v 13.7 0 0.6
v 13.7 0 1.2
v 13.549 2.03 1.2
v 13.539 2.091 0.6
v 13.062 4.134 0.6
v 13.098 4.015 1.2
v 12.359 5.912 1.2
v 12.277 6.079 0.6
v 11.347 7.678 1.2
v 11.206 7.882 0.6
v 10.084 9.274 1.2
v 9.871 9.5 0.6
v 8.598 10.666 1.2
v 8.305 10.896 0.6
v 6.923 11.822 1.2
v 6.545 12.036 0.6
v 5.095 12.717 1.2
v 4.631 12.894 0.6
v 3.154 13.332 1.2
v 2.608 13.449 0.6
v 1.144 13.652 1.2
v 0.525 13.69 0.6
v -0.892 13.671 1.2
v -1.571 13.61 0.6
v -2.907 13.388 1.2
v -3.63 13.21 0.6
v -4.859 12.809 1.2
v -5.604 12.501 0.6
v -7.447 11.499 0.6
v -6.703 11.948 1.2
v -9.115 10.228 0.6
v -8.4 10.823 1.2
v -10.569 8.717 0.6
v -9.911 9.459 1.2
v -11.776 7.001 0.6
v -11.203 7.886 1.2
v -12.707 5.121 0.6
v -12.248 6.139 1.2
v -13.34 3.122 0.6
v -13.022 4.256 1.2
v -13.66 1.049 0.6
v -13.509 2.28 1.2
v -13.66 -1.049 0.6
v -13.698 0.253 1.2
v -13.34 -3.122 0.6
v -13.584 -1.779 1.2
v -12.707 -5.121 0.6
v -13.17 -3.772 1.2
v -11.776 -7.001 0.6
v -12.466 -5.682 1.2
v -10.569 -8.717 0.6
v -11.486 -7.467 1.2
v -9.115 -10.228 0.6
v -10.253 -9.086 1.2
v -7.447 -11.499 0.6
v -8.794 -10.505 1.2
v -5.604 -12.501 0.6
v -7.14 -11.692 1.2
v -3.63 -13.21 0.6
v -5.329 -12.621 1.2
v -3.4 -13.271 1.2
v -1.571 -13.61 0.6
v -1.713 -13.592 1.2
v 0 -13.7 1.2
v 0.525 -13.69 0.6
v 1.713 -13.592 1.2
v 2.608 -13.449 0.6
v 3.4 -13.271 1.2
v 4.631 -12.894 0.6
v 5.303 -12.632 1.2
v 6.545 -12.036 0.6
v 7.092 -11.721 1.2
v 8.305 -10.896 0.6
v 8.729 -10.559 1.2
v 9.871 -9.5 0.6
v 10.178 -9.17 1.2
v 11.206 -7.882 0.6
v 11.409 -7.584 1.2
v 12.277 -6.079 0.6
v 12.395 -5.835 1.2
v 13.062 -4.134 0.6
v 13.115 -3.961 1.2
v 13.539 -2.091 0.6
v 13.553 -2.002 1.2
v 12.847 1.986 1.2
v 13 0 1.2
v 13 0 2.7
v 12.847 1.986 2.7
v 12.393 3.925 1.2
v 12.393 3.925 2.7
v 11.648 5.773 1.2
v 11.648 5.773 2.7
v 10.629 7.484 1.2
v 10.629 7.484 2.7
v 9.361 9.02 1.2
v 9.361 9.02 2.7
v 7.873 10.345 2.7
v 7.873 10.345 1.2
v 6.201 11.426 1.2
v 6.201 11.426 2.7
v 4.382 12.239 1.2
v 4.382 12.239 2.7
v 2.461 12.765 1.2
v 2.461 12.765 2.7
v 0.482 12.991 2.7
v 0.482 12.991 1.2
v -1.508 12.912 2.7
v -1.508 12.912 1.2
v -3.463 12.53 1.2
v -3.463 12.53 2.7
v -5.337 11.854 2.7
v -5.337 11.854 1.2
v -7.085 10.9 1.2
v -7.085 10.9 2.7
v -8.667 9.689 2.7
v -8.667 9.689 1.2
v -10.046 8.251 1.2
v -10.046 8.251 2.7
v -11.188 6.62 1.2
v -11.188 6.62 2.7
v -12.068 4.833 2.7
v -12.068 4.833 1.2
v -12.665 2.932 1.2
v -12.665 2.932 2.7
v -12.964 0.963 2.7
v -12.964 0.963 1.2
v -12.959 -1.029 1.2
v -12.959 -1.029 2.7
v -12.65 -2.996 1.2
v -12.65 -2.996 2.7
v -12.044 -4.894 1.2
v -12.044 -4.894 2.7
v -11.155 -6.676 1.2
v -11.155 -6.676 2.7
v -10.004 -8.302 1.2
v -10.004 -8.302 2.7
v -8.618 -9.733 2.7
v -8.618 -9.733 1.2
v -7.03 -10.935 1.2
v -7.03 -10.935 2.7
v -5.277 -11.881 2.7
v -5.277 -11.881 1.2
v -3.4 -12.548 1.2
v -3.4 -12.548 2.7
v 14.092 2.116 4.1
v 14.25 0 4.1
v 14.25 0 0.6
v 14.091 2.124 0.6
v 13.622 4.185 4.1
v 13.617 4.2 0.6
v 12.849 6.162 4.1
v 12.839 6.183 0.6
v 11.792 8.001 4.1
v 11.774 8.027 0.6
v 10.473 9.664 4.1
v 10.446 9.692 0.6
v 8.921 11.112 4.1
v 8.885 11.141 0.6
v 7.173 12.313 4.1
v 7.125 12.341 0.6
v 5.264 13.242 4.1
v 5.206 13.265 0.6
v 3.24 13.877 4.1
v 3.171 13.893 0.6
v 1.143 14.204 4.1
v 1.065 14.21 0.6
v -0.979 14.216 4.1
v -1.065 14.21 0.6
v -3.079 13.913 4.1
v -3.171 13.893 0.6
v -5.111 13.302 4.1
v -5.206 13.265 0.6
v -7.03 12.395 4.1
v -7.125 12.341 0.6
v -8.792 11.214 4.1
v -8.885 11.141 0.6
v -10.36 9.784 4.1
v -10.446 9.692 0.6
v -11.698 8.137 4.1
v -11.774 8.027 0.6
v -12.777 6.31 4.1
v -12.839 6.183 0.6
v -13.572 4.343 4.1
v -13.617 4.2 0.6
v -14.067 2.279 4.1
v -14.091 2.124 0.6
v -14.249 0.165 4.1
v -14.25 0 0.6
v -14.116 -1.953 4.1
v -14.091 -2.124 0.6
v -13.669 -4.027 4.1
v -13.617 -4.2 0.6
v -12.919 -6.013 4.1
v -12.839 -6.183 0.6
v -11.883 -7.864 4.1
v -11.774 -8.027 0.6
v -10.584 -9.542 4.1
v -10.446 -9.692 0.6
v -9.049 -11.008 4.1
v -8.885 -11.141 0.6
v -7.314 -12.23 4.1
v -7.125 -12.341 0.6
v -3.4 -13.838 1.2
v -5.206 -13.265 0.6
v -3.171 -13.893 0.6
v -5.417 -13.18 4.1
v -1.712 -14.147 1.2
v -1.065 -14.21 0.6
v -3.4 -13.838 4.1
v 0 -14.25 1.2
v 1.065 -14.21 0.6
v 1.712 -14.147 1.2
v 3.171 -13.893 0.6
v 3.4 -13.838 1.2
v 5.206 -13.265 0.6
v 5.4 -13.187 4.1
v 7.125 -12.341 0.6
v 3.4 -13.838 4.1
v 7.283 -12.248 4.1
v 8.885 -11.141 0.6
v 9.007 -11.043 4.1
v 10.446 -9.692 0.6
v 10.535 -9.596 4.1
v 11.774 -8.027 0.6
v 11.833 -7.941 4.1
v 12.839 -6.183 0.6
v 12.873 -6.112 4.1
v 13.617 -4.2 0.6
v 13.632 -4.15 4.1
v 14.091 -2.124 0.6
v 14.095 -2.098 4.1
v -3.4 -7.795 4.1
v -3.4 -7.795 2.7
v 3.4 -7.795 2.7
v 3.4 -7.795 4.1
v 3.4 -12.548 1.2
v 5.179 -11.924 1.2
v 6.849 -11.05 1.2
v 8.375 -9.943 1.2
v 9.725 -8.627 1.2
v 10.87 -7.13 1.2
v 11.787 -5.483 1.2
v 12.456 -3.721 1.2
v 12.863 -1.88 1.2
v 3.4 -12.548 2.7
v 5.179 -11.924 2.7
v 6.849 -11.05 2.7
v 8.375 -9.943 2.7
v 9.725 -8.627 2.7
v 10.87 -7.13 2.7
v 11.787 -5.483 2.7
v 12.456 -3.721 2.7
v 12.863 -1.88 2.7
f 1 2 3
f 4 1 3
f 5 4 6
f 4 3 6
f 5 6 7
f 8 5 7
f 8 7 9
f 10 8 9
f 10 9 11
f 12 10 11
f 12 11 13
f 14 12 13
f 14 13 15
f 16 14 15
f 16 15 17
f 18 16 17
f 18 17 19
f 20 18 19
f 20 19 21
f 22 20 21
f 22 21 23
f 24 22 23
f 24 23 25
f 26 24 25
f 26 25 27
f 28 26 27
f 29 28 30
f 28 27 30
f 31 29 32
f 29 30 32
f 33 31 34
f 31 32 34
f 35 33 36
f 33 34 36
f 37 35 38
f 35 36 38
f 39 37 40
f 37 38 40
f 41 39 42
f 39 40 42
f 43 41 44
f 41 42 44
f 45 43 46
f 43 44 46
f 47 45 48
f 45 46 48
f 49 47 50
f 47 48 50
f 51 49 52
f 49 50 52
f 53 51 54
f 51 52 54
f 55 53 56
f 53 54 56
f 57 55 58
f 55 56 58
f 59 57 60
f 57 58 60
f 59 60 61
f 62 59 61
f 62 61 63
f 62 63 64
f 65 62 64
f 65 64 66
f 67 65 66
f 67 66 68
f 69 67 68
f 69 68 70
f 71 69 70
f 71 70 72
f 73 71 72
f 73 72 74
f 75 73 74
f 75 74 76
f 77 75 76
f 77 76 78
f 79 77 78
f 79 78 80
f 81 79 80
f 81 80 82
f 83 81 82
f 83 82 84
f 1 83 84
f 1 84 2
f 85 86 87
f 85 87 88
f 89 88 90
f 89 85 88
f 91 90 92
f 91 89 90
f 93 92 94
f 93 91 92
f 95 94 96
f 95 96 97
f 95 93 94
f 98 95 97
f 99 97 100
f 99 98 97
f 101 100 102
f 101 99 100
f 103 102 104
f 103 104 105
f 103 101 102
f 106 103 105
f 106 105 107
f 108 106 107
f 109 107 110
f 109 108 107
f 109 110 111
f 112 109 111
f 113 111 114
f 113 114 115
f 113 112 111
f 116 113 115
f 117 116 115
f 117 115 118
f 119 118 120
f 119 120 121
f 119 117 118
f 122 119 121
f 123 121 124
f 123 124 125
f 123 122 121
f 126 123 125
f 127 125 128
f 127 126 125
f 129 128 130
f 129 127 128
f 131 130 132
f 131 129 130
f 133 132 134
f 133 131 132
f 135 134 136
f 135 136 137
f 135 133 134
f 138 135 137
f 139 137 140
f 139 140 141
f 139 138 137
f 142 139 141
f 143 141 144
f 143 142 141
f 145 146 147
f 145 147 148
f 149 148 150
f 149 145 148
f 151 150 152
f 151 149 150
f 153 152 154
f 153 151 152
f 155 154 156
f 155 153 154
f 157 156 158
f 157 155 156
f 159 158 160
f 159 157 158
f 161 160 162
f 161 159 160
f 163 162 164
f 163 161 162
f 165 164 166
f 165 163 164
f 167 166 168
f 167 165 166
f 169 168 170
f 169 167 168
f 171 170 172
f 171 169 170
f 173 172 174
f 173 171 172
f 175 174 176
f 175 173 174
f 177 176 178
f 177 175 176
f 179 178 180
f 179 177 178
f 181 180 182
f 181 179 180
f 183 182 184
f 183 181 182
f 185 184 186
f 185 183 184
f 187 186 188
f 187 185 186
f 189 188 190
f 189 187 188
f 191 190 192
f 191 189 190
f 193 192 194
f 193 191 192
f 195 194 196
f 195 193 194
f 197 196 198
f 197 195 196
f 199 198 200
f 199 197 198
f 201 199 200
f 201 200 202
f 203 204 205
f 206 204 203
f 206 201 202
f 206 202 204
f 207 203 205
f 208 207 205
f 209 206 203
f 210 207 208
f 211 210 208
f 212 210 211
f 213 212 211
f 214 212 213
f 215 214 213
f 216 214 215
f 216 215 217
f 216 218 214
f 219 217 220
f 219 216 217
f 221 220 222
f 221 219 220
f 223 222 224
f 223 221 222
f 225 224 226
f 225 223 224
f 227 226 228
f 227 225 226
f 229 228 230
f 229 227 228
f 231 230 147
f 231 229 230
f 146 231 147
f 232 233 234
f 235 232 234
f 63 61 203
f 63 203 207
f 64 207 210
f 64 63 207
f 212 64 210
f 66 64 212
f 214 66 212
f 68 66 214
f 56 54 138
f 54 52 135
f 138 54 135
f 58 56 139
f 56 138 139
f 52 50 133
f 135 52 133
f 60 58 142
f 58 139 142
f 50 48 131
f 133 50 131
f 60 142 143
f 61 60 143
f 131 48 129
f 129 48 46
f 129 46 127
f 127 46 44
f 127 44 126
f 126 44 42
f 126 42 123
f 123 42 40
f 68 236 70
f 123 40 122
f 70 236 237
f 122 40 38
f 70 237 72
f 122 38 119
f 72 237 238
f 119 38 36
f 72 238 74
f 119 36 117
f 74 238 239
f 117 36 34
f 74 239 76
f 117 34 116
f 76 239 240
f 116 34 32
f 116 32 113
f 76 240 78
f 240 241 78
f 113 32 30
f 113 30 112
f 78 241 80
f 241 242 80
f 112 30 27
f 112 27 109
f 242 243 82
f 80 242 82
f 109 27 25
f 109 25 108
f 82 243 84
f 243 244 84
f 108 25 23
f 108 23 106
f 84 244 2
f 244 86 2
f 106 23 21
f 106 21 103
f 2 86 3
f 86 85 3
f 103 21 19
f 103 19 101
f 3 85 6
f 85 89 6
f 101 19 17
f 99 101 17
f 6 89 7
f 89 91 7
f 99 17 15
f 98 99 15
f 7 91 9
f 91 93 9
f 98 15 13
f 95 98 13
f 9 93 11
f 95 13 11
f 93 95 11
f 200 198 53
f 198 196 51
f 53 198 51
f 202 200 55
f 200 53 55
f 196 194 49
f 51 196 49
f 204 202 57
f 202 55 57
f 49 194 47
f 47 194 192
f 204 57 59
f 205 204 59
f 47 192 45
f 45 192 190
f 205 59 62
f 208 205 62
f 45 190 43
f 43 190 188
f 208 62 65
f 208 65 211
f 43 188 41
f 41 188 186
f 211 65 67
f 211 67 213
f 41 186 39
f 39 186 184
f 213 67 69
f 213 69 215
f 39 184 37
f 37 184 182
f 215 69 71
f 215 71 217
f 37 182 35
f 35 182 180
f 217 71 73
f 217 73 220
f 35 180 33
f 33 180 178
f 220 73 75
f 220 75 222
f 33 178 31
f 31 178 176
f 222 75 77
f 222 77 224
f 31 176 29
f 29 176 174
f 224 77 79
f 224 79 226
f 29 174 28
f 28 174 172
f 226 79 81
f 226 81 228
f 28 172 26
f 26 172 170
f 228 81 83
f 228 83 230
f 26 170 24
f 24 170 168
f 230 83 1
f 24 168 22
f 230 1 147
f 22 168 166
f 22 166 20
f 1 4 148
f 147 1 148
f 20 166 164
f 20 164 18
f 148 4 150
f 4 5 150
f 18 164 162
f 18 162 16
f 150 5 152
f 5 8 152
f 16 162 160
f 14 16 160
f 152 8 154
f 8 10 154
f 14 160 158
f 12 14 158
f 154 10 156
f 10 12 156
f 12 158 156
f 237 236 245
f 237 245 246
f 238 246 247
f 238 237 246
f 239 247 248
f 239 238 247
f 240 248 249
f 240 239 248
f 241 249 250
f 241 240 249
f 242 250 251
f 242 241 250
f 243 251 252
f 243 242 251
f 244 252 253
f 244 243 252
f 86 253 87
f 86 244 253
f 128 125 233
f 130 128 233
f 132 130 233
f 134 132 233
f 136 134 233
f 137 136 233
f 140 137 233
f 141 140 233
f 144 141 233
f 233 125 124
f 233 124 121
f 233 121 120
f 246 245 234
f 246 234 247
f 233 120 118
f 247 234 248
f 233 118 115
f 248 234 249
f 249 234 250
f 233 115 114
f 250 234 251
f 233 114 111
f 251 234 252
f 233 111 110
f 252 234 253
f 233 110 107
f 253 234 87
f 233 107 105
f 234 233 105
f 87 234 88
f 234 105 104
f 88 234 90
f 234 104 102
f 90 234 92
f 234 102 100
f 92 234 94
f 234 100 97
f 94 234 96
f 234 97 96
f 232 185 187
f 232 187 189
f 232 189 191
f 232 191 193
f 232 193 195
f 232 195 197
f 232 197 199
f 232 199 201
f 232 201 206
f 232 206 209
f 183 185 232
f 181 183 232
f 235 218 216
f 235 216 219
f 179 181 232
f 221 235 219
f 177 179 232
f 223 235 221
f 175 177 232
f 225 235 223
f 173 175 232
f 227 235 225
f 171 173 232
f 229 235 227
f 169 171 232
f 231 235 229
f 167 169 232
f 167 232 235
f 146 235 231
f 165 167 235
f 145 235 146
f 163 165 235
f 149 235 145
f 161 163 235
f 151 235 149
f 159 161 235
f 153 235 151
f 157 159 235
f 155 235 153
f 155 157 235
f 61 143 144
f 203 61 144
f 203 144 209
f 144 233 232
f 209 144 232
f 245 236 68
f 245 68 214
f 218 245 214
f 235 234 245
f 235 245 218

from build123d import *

# Parameters (mm, degrees)
F0_R     = 13.5
F0_W     = 6
F0_H     = 4.25
F1_DEPTH = 1.2
F2_DEPTH = 4.2
F3_R     = 14.25
F3_R_2   = 13.7
F3_R_3   = 13.5
F4_DEPTH = 2.9
F5_DEPTH = 0.6
F3_W     = 6
F3_H     = 4.25
F6_DEPTH = 1.5
F7_W     = 6.8
F7_H     = 3
F8_DEPTH = 8


with BuildPart() as f1:
    # F0 (on Top) → F1 (new body)
    with BuildSketch(Plane.XY):
        Circle(F0_R)
        with Locations((0, -10.295)):
            Rectangle(F0_W, F0_H, mode=Mode.SUBTRACT)
        with Locations((0, -10.295)):
            Rectangle(F0_W, F0_H)
    extrude(amount=F1_DEPTH)

    # F0 (on Top) → F2 (join)
    with BuildSketch(Plane.XY):
        with Locations((0, -10.295)):
            Rectangle(F0_W, F0_H)
    extrude(amount=F2_DEPTH)


with BuildPart() as f4:
    # F3 (on face) → F4 (new body)
    with BuildSketch(Plane.XY.offset(1.2)):
        Circle(F3_R)
        Circle(F3_R_2, mode=Mode.SUBTRACT)
        Circle(F3_R_2)
        Circle(F3_R_3, mode=Mode.SUBTRACT)
        Circle(F3_R_3)
        with BuildLine():
            Line((3.4, -12.5475097131), (3.4, -12.795))
            Line((3.4, -12.795), (2.2995597405, -12.795))
            ThreePointArc((2.2995597405, -12.795), (0, -13), (-2.2995597405, -12.795))
            Line((-2.2995597405, -12.795), (-3.4, -12.795))
            Line((-3.4, -12.795), (-3.4, -12.5475097131))
            ThreePointArc((-3.4, -12.5475097131), (-7.8993670633, 10.3247275993), (13, 0))
            ThreePointArc((13, 0), (10.3247275993, -7.8993670633), (3.4, -12.5475097131))
        make_face(mode=Mode.SUBTRACT)
        with BuildLine():
            Line((3.4, -7.795), (3.4, -12.5475097131))
            ThreePointArc((3.4, -12.5475097131), (10.3247275993, -7.8993670633), (13, 0))
            ThreePointArc((13, 0), (-7.8993670633, 10.3247275993), (-3.4, -12.5475097131))
            Line((-3.4, -12.5475097131), (-3.4, -7.795))
            Line((-3.4, -7.795), (3.4, -7.795))
        make_face()
        with BuildLine():
            ThreePointArc((-2.2995597405, -12.795), (0, -13), (2.2995597405, -12.795))
            Line((2.2995597405, -12.795), (-2.2995597405, -12.795))
        make_face()
    extrude(amount=F4_DEPTH)

    # F3 (on face) → F5 (join)
    with BuildSketch(Plane.XY.offset(1.2)):
        Circle(F3_R)
        Circle(F3_R_2, mode=Mode.SUBTRACT)
    extrude(amount=-F5_DEPTH)

    # F3 (on face) → F6 (cut)
    with BuildSketch(Plane.XY.offset(1.2)):
        with BuildLine():
            Line((3.4, -7.795), (3.4, -12.5475097131))
            ThreePointArc((3.4, -12.5475097131), (10.3247275993, -7.8993670633), (13, 0))
            ThreePointArc((13, 0), (-7.8993670633, 10.3247275993), (-3.4, -12.5475097131))
            Line((-3.4, -12.5475097131), (-3.4, -7.795))
            Line((-3.4, -7.795), (3.4, -7.795))
        make_face()
        with BuildLine():
            Line((-2.2995597405, -12.795), (2.2995597405, -12.795))
            ThreePointArc((2.2995597405, -12.795), (2.8524652793, -12.6831952532), (3.4, -12.5475097131))
            Line((3.4, -12.5475097131), (3.4, -7.795))
            Line((3.4, -7.795), (-3.4, -7.795))
            Line((-3.4, -7.795), (-3.4, -12.5475097131))
            ThreePointArc((-3.4, -12.5475097131), (-2.8524652793, -12.6831952532), (-2.2995597405, -12.795))
        make_face()
        with Locations((0, -10.295)):
            Rectangle(F3_W, F3_H, mode=Mode.SUBTRACT)
        with BuildLine():
            ThreePointArc((-2.2995597405, -12.795), (0, -13), (2.2995597405, -12.795))
            Line((2.2995597405, -12.795), (-2.2995597405, -12.795))
        make_face()
    extrude(amount=F6_DEPTH, mode=Mode.SUBTRACT)

    # F7 (on face) → F8 (cut)
    with BuildSketch(Plane.XZ.offset(12.42)):
        with Locations((0, 2.7)):
            Rectangle(F7_W, F7_H)
    extrude(amount=F8_DEPTH, mode=Mode.SUBTRACT)


solid = f4.part
